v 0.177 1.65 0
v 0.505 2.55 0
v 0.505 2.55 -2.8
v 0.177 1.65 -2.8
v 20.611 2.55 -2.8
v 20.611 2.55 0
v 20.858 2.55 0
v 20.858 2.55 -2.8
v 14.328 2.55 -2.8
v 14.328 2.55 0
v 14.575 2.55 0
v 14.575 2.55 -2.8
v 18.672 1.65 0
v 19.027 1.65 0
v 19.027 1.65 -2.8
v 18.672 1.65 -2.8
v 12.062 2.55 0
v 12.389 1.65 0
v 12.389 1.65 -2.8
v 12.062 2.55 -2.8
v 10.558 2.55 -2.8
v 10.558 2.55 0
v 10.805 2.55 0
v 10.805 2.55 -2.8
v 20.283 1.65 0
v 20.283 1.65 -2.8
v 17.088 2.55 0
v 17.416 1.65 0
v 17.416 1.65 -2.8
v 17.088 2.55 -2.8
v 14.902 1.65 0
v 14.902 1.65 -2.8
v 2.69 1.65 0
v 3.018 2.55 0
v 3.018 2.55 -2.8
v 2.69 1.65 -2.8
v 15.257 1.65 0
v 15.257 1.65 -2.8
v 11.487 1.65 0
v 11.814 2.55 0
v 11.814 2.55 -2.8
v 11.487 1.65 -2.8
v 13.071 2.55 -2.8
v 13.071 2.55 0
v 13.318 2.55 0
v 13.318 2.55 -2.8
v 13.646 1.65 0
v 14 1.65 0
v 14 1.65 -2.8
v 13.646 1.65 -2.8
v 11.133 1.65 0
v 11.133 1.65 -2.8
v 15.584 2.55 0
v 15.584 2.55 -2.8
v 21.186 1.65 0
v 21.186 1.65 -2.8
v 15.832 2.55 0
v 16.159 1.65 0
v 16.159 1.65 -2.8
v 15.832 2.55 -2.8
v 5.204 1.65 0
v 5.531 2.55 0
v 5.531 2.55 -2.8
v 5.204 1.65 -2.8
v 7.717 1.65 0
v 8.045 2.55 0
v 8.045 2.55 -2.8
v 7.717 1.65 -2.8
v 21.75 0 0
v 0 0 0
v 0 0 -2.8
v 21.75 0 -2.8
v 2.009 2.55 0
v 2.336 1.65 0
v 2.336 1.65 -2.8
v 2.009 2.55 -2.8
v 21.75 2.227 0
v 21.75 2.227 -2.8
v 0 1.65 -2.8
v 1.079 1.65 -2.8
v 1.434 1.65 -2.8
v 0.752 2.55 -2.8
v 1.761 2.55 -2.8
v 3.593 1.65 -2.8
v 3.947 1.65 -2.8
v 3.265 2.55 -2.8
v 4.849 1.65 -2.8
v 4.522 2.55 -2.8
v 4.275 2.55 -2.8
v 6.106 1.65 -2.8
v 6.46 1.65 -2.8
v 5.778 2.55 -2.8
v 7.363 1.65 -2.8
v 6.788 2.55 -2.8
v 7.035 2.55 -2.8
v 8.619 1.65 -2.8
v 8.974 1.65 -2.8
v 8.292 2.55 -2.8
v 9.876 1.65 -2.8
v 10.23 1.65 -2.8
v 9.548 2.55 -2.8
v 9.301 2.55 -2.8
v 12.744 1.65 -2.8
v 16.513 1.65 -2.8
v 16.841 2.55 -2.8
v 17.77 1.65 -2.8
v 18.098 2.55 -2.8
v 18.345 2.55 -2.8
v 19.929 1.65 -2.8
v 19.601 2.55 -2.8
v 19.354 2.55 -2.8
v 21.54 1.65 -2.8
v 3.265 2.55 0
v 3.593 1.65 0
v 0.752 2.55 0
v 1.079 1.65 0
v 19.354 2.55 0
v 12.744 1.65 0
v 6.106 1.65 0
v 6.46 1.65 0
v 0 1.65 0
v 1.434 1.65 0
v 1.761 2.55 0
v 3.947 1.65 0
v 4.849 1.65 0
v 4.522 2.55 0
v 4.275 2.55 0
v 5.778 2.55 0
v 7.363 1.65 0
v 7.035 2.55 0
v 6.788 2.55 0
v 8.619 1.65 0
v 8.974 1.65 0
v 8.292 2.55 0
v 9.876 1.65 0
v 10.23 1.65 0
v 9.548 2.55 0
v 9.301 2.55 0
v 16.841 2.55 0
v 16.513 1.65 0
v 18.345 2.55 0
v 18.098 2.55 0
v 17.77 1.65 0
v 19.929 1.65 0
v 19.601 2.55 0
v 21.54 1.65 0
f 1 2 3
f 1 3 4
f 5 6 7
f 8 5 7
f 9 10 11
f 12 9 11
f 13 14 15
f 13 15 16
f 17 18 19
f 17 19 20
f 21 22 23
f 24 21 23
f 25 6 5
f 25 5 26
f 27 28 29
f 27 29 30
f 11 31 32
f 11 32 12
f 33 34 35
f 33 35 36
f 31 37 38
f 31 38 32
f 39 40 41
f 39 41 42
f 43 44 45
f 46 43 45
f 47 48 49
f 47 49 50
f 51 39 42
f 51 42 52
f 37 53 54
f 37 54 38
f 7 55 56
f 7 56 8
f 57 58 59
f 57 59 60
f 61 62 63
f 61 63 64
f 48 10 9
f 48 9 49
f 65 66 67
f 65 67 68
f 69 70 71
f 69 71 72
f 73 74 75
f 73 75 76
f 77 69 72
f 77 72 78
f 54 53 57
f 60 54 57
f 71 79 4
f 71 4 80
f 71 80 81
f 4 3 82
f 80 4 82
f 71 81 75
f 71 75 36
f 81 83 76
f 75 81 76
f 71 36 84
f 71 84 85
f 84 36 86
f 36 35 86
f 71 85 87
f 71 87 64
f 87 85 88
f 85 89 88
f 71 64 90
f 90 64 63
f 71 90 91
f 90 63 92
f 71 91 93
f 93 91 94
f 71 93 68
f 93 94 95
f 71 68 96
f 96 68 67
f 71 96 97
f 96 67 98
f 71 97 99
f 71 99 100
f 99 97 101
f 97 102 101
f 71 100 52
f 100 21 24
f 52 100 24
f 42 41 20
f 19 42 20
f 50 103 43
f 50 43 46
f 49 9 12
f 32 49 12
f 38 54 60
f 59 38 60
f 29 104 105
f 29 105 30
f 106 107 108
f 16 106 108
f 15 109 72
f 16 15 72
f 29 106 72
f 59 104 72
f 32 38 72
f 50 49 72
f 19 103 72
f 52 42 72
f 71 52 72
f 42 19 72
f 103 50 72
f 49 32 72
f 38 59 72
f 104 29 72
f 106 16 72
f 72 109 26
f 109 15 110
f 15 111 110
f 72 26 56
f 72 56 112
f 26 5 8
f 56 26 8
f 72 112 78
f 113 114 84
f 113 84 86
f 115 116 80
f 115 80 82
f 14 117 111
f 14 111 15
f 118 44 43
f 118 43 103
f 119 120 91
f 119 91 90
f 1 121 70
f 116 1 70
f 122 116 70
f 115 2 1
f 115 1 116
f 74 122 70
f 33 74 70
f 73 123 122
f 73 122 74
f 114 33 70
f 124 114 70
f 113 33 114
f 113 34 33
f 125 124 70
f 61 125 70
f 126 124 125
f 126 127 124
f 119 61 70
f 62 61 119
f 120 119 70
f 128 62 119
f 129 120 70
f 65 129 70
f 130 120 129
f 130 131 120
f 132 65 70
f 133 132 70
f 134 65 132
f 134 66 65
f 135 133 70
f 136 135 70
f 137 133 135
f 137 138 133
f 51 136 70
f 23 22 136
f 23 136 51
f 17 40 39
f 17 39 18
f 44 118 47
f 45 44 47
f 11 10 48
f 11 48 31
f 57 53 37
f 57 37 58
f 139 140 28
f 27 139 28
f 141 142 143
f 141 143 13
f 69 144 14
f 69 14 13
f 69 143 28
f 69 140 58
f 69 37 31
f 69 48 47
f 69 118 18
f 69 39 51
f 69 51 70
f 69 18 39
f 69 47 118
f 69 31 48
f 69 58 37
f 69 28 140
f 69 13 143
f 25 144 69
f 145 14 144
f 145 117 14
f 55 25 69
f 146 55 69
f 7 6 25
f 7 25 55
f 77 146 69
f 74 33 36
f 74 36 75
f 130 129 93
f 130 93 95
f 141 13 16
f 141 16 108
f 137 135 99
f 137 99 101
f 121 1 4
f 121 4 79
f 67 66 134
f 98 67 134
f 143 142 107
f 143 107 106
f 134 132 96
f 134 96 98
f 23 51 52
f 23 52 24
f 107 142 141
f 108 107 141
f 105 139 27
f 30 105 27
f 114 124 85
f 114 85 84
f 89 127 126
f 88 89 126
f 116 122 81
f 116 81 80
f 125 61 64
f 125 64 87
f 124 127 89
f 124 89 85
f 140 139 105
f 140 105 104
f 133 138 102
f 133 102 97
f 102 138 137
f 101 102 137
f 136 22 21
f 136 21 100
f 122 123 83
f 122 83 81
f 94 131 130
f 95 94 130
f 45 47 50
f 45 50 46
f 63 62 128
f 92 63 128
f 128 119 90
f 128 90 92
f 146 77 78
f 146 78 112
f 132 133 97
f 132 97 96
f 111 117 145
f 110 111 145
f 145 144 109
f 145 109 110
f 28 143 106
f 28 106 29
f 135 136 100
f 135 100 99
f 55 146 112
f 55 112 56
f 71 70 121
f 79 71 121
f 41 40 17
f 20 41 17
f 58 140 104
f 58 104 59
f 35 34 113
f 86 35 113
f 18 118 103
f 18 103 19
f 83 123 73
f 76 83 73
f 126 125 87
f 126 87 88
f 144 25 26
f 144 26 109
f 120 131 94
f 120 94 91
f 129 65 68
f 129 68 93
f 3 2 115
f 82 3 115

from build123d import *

# Parameters (mm, degrees)
BLANKSKE_W        = 21.75
BLANKSKE_H        = 2.55
BLANK_DEPTH       = 2.8
TOOTHCUTSIM_DEPTH = 23.077250735
TEETHCUTS_COUNT   = 18
TEETHCUTS_PITCH   = 1.25663706


with BuildPart() as part:
    # BlankSke → Blank (new body)
    with BuildSketch(Plane.XY):
        with Locations((10.875, 1.275)):
            Rectangle(BLANKSKE_W, BLANKSKE_H)
    extrude(amount=-BLANK_DEPTH)

    # TooCutSkeSim → ToothCutSim (cut, through all)
    with BuildSketch(Plane.XY):
        Polygon((0.177174148, 1.65), (-0.177174148, 1.65), (-0.513992203, 2.5754), (0.513992203, 2.5754), align=None)
    toothcutsim = extrude(amount=-TOOTHCUTSIM_DEPTH, mode=Mode.SUBTRACT)

    # TeethCuts: ToothCutSim ×18
    with Locations(*[(i * TEETHCUTS_PITCH, 0, 0) for i in range(1, TEETHCUTS_COUNT)]):
        add(toothcutsim, mode=Mode.SUBTRACT)


solid = part.part
